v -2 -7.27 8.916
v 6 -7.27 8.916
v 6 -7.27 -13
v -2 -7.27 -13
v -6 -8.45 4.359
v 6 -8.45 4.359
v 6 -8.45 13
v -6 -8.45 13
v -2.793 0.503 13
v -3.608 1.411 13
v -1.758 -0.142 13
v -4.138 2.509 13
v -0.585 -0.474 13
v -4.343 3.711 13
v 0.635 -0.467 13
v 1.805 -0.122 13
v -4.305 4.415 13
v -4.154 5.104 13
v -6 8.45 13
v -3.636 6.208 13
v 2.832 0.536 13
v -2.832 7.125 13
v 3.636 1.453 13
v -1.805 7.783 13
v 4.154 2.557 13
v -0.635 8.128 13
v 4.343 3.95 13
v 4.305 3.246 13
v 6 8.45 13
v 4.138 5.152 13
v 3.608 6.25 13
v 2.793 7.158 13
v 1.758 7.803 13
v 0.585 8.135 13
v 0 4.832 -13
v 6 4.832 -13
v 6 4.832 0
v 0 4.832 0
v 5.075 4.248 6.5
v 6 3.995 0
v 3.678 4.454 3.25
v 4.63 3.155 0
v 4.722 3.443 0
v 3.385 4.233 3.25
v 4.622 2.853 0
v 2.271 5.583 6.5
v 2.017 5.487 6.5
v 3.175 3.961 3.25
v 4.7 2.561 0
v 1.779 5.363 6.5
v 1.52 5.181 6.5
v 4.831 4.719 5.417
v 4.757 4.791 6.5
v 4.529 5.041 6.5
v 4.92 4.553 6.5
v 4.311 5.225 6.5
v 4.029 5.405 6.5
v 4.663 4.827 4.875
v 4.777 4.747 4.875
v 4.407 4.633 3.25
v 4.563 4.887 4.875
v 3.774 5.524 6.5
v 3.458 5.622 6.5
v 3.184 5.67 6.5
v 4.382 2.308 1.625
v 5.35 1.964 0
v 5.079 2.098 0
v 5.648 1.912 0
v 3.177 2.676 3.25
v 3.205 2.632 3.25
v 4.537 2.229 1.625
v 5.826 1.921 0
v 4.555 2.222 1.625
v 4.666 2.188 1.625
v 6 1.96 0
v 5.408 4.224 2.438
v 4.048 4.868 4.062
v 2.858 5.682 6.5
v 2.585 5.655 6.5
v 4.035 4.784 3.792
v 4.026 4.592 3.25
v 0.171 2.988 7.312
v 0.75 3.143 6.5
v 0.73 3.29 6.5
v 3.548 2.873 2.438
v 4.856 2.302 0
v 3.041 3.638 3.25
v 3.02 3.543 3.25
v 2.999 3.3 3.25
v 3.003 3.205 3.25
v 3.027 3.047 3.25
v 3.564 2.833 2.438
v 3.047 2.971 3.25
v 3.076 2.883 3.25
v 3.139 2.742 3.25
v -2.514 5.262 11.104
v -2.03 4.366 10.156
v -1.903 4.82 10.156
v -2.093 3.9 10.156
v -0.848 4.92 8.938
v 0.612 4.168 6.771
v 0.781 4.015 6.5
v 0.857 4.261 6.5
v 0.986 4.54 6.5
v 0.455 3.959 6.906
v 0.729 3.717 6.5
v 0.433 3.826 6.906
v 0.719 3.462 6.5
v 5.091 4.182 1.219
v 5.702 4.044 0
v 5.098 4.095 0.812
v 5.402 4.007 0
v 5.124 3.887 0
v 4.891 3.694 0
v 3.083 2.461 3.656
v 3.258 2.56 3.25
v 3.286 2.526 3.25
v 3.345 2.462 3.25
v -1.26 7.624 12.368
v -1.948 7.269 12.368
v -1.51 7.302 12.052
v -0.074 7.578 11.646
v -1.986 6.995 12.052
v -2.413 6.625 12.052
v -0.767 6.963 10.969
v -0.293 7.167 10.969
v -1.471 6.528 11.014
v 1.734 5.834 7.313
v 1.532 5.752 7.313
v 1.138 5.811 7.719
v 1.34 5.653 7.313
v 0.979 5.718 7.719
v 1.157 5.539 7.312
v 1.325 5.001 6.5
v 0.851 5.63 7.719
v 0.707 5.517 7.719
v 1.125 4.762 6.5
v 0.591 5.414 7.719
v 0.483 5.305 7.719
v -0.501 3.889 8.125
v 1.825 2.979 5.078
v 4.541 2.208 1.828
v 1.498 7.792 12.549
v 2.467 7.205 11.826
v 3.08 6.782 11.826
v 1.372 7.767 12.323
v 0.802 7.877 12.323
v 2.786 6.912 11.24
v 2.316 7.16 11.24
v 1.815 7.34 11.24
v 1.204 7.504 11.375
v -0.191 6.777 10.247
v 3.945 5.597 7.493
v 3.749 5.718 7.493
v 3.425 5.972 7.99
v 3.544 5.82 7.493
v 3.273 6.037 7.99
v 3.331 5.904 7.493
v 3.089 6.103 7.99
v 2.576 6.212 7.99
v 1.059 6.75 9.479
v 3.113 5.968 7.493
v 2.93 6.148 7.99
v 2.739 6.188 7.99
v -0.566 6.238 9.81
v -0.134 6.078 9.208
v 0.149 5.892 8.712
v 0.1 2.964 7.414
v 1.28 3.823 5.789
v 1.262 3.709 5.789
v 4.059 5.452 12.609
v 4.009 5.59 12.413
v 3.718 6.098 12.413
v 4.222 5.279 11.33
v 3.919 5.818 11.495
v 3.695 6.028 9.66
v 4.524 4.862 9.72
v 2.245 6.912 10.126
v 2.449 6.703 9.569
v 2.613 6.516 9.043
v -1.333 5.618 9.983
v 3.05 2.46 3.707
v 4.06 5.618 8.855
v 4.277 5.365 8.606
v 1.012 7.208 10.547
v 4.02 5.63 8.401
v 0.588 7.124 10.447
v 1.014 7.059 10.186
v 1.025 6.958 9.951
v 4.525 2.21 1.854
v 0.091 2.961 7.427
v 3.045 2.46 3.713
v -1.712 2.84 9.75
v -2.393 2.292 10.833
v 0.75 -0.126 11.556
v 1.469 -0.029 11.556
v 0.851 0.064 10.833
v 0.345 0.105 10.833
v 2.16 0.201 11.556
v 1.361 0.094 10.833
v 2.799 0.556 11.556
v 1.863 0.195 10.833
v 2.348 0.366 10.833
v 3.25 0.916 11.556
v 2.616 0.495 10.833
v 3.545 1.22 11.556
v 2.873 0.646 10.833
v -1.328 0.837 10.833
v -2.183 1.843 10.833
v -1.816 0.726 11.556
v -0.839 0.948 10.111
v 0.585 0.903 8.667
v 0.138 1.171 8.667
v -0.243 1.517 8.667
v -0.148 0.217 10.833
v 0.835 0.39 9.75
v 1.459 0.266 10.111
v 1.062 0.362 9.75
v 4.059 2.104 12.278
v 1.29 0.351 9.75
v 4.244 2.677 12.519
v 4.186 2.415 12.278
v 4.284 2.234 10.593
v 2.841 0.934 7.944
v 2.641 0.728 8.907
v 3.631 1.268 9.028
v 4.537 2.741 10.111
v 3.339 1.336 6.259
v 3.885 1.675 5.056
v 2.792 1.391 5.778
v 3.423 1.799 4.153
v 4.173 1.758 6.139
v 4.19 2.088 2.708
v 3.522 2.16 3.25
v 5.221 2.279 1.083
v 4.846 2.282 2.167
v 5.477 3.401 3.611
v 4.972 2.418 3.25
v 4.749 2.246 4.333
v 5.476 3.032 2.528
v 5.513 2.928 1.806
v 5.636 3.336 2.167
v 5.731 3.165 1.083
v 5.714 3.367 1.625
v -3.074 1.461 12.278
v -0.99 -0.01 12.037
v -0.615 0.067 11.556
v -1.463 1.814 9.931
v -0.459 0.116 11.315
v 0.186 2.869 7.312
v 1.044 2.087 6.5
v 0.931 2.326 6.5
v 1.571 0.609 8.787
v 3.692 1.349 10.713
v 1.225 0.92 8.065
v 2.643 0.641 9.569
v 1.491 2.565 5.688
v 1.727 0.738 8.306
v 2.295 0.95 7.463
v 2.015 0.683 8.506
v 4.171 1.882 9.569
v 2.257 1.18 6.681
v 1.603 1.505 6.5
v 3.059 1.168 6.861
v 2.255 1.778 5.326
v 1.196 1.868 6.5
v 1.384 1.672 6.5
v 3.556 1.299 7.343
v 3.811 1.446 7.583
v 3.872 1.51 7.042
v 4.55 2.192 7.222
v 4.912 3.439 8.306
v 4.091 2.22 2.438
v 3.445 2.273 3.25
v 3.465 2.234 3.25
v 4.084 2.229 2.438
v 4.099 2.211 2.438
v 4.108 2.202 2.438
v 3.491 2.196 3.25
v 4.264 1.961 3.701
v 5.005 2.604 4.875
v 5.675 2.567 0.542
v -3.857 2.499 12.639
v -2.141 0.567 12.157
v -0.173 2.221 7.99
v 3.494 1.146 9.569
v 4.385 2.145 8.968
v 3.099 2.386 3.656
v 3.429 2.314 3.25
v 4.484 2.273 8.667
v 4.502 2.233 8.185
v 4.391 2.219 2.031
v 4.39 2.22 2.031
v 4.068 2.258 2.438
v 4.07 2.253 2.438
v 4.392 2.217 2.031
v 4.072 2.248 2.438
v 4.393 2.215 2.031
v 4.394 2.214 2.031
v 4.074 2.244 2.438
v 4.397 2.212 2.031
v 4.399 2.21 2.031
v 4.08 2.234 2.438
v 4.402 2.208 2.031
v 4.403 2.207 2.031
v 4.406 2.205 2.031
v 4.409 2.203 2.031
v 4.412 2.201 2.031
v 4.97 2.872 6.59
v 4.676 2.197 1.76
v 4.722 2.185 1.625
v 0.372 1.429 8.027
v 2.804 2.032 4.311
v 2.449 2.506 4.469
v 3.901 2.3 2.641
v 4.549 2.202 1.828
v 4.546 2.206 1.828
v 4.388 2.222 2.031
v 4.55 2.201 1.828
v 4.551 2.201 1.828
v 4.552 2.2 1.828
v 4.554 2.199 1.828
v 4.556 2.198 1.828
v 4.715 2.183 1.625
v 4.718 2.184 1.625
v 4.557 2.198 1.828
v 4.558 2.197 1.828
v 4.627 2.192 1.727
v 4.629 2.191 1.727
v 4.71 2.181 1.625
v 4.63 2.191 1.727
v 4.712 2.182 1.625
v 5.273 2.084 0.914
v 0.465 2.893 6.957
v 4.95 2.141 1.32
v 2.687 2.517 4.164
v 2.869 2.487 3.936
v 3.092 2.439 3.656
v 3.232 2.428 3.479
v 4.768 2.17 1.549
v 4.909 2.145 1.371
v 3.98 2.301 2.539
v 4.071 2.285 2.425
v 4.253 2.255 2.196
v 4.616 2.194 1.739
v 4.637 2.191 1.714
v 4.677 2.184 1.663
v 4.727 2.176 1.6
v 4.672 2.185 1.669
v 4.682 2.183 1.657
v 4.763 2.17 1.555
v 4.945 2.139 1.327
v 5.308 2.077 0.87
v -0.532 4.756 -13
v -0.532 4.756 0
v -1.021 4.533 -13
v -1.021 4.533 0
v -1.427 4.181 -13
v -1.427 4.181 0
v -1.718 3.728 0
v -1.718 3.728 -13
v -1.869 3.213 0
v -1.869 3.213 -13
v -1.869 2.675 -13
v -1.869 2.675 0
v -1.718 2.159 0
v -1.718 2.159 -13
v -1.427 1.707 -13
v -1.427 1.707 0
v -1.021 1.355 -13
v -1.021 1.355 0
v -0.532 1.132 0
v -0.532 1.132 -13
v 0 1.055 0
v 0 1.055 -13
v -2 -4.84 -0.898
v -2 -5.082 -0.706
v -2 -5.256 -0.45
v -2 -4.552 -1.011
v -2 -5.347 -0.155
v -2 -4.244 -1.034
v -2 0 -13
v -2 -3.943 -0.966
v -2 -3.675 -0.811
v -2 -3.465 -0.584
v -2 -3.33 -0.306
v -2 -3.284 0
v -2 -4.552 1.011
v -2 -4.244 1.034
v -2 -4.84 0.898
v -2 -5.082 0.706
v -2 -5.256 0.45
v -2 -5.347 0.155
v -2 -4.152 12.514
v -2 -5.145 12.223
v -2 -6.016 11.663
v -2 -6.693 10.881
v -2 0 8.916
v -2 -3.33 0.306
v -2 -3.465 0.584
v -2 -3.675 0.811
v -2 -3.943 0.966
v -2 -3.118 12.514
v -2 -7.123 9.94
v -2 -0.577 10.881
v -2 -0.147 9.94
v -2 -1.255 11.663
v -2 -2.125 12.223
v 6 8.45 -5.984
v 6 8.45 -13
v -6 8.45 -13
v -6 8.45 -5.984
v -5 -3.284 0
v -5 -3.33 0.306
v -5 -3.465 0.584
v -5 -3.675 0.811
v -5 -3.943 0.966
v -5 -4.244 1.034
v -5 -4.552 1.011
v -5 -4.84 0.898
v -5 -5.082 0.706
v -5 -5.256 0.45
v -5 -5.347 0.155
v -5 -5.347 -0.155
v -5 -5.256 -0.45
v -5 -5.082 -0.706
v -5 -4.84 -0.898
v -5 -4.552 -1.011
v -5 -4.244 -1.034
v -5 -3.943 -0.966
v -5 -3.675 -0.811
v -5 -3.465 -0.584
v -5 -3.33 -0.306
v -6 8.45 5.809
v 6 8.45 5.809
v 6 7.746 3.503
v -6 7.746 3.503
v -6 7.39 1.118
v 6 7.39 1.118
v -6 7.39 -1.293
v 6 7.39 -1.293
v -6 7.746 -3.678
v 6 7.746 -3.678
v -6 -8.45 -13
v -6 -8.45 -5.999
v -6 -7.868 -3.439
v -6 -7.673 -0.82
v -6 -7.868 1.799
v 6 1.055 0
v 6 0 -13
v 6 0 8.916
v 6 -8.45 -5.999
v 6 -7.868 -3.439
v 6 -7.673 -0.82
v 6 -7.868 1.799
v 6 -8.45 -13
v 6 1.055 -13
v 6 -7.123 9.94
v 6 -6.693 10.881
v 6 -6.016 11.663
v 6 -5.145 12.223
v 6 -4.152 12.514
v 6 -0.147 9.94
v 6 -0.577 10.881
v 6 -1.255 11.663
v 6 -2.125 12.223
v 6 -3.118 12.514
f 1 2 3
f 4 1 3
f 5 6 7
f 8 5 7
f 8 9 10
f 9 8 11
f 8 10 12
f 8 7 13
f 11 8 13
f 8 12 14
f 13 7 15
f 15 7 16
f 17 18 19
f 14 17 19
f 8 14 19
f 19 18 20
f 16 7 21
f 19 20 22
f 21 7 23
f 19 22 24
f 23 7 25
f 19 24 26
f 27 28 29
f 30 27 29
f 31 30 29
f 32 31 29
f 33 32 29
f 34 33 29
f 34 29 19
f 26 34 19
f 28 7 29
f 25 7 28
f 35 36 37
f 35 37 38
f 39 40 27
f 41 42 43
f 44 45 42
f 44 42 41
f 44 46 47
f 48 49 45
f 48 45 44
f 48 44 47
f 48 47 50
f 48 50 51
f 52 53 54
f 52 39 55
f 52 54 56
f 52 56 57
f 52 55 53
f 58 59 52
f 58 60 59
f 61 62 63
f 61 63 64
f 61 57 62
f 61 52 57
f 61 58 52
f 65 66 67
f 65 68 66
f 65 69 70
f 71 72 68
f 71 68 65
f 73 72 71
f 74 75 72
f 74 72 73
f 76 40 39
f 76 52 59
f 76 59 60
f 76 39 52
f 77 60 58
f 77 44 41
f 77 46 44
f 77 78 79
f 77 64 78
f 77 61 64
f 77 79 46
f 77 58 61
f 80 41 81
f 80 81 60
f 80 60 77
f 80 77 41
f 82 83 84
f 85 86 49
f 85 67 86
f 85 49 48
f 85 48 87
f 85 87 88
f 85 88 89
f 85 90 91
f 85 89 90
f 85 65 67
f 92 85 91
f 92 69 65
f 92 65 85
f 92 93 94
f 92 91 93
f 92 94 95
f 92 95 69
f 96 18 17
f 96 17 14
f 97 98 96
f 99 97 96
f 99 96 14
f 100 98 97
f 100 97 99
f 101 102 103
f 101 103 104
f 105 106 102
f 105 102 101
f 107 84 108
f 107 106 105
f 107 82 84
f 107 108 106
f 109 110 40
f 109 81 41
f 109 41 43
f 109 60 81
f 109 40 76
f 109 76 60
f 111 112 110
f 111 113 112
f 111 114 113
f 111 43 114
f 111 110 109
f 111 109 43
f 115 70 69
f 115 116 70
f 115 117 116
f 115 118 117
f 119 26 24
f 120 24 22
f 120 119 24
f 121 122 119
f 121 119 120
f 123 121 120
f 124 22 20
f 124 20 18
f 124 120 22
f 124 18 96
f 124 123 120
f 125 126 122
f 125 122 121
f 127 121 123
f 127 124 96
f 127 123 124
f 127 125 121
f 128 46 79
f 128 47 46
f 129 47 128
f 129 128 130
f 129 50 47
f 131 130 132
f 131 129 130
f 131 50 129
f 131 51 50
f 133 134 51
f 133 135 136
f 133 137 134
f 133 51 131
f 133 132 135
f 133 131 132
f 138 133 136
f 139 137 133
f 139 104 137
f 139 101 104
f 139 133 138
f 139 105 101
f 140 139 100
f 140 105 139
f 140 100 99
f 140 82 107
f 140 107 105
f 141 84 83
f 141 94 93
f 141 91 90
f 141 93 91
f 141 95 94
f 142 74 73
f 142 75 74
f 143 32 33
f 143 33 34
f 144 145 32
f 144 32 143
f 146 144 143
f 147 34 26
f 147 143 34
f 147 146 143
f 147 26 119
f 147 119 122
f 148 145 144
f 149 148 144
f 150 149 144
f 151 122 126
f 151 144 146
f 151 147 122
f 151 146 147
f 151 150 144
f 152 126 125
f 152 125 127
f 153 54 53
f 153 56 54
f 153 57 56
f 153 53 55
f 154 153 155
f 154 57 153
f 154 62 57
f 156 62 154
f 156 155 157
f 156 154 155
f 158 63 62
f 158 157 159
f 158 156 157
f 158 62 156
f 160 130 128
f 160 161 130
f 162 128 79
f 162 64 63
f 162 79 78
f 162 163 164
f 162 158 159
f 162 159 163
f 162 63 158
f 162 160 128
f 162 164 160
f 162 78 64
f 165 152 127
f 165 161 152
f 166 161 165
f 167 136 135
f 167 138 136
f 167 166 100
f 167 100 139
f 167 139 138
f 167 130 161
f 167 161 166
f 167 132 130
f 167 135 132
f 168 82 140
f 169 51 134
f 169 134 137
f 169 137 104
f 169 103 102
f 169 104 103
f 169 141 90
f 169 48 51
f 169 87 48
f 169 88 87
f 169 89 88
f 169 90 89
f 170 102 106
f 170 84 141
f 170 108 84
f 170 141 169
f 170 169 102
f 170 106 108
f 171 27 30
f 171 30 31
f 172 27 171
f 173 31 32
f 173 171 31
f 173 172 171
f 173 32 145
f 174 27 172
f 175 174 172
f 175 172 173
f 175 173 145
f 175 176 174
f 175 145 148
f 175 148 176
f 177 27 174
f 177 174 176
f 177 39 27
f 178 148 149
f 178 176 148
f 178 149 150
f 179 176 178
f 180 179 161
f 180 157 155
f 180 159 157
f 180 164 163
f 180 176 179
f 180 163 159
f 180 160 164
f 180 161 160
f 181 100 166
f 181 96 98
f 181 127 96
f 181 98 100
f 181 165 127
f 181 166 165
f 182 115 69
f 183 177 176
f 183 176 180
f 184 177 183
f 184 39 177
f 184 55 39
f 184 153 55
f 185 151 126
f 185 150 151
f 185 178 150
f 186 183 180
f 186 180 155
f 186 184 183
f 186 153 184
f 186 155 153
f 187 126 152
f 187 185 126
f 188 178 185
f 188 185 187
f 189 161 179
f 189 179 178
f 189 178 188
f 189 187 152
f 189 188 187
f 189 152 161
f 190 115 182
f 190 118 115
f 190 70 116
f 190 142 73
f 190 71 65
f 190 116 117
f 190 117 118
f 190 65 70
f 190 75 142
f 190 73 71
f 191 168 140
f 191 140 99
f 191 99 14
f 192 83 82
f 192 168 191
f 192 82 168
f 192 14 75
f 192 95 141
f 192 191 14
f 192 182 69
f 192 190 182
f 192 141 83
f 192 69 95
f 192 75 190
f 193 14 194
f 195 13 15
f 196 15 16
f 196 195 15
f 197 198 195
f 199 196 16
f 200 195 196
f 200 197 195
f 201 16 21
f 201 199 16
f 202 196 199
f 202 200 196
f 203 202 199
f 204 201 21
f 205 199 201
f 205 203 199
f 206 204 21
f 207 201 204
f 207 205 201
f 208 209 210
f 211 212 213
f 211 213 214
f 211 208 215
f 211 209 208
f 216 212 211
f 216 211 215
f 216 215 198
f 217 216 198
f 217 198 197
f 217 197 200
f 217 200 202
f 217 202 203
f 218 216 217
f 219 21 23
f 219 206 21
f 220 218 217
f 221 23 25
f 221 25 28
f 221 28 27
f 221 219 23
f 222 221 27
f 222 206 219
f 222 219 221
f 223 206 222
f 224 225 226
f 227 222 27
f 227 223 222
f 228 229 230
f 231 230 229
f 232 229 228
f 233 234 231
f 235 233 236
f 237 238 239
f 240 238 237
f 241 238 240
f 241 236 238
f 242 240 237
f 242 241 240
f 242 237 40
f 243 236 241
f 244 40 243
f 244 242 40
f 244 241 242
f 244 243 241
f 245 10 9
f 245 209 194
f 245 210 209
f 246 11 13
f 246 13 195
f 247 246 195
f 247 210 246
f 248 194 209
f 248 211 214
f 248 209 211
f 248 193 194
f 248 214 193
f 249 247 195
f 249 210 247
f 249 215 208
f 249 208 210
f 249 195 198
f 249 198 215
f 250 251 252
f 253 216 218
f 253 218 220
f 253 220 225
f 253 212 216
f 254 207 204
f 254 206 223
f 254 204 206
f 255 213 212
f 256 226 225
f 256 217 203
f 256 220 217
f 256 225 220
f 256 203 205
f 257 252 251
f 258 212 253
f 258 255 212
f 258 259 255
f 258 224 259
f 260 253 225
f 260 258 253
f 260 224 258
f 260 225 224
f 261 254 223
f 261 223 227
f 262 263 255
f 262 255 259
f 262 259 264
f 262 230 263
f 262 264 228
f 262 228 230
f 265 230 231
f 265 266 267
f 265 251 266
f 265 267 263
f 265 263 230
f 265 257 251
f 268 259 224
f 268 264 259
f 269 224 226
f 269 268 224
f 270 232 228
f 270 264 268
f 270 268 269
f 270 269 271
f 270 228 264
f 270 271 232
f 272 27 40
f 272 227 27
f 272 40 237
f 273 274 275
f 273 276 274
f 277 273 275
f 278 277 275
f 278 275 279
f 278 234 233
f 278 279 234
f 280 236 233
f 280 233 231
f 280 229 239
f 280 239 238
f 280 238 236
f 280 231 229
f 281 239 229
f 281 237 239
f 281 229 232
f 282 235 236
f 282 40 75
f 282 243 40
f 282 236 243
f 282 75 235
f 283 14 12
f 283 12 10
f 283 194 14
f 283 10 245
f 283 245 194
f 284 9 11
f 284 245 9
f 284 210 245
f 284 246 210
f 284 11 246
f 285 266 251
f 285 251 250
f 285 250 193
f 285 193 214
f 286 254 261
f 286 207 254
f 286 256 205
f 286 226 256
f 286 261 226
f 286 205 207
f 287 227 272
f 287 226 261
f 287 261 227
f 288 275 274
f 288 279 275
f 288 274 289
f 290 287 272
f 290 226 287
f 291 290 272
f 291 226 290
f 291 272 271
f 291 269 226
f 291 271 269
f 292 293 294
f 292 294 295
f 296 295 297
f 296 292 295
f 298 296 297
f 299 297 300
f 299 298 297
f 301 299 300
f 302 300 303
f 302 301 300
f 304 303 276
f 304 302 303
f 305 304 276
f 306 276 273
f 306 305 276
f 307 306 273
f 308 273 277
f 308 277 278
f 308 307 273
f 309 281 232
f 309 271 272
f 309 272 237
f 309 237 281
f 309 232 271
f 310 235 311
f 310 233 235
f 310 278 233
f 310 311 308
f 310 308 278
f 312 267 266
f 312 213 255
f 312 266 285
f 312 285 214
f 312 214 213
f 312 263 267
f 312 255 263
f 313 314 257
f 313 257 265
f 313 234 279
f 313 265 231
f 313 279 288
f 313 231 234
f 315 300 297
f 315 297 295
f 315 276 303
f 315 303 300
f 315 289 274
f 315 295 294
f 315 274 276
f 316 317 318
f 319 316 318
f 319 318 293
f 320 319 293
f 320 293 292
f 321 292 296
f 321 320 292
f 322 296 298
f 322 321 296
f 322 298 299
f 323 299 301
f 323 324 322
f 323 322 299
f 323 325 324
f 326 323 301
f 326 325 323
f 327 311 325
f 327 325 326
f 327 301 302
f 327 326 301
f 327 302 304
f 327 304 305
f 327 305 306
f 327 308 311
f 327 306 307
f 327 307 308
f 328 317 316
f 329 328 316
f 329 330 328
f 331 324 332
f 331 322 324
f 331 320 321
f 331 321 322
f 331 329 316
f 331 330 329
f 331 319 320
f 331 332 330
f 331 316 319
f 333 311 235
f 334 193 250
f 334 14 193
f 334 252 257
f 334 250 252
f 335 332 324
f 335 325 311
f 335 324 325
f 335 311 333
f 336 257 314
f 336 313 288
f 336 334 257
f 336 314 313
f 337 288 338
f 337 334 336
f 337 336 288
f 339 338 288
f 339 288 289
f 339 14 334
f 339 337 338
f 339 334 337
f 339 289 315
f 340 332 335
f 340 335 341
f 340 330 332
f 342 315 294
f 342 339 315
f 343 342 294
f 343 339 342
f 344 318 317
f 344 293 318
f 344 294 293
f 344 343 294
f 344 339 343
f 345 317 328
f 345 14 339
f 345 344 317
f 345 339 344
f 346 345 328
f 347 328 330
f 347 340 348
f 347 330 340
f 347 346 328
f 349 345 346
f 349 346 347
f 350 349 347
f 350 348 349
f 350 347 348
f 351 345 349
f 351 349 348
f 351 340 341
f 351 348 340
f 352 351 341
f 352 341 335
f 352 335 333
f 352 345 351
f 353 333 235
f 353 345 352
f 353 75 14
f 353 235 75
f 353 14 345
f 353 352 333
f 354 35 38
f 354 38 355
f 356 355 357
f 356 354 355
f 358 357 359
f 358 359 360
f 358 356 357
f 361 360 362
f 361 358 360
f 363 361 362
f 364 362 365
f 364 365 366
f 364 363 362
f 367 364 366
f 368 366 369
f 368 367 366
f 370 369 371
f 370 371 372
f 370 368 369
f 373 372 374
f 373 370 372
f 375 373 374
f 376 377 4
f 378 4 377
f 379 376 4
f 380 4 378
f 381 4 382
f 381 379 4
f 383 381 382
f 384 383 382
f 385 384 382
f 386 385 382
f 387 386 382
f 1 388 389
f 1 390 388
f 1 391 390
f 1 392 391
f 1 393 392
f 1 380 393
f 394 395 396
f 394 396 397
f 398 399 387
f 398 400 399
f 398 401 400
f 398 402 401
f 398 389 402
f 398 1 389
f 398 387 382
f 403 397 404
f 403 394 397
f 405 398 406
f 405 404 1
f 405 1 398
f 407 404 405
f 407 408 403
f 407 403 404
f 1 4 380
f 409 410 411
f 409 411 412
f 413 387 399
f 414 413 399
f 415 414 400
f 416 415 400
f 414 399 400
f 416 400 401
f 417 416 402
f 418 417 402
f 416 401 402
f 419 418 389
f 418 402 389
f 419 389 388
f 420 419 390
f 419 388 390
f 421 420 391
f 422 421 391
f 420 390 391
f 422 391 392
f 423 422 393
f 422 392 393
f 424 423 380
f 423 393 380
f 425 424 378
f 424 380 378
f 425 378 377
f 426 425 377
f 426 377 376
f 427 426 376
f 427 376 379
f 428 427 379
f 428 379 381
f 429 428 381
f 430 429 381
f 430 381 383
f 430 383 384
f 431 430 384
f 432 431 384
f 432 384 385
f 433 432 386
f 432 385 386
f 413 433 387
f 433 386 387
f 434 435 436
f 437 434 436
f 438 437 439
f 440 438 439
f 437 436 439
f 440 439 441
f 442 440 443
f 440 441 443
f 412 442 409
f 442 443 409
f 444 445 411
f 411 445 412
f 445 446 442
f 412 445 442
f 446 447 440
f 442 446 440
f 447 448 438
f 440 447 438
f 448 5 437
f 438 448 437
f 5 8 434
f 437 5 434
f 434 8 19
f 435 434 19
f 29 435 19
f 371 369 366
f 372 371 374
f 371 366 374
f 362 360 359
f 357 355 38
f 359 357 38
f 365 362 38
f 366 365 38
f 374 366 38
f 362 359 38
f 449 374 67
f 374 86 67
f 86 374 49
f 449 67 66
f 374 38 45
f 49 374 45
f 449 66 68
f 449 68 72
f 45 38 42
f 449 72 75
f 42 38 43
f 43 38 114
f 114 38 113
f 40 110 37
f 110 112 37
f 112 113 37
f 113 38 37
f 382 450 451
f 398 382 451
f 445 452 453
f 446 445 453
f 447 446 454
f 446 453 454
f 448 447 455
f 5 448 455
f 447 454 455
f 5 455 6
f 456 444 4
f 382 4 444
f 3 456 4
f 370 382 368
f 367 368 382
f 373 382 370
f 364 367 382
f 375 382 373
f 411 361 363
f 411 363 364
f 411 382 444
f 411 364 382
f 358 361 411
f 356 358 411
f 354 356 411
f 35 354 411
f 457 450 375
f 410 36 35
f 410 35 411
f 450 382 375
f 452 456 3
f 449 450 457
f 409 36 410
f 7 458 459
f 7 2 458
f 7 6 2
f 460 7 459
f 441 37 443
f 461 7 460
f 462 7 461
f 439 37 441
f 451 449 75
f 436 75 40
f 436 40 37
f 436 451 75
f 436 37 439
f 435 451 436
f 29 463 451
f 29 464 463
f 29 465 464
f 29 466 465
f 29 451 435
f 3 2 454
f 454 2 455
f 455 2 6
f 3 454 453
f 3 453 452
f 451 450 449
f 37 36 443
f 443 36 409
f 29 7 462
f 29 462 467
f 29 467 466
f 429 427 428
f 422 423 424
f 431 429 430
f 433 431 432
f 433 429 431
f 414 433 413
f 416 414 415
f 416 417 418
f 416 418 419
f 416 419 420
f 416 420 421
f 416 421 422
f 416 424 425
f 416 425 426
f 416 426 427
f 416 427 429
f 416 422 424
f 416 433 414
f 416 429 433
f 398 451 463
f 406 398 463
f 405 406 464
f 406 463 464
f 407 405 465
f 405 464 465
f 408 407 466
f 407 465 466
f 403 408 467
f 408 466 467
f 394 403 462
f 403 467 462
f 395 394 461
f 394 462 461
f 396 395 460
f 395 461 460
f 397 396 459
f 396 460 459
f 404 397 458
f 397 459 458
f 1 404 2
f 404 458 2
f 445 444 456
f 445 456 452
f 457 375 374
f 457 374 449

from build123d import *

# Parameters (mm, degrees)
F0_W      = 16.9
F0_H      = 26
F1_DEPTH  = 6
F4_DEPTH  = 8
F7_DEPTH  = 13
F13_R     = 1.0372867361
F14_DEPTH = 3
F16_DEPTH = 12


# Not quite as in the source:
# - the arcs of a loft's sections are written as splines that run evenly, so that the points pair up as in the source's solid


with BuildPart() as f1:
    # F0 (on Right) → F1 (new body, symmetric)
    with BuildSketch(Plane.YZ):
        Rectangle(F0_W, F0_H)
    extrude(amount=F1_DEPTH, both=True)

    # F3 (on offset) → F4 (cut)
    with BuildSketch(Plane.YZ.offset(6)):
        with BuildLine():
            Line((0, -13.1401689723), (0, 0))
            Line((0, 0), (0, 8.9160166681))
            ThreePointArc((0, 8.9160166681), (-3.6351196468, 12.5511363149), (-7.2702392936, 8.9160166681))
            Line((-7.2702392936, 8.9160166681), (-7.2702392936, 0))
            Line((-7.2702392936, 0), (-7.2702392936, -13.1401689723))
            Line((-7.2702392936, -13.1401689723), (0, -13.1401689723))
        make_face()
    extrude(amount=-F4_DEPTH, mode=Mode.SUBTRACT)

    # F6 (on offset) → F7 (cut)
    with BuildSketch(Plane.XY.offset(-13)):
        with BuildLine():
            Line((0, 1.0551682208), (6, 1.0551682208))
            Line((6, 1.0551682208), (6, 4.8324568197))
            Line((6, 4.8324568197), (0, 4.8324568197))
            ThreePointArc((0, 4.8324568197), (-1.8886442995, 2.9438125202), (0, 1.0551682208))
        make_face()
    extrude(amount=F7_DEPTH, mode=Mode.SUBTRACT)

    # F10 (on offset) → F11 section 0
    with BuildSketch(Plane.XY.offset(13)):
        with BuildLine():
            add(Edge.make_bspline(
                [(4.3429478235, 3.9498277403), (4.3273258404, 4.518318281), (4.1986746967, 5.0834789619), (3.734705213, 6.1219559637), (3.3995694252, 6.5948636881), (2.5735095721, 7.3767379005), (2.0829105259, 7.6853967543), (1.0205204277, 8.0916349162), (0.4491473807, 8.1890543869), (-0.6878337007, 8.1578104207), (-1.2529943817, 8.0291592769), (-2.2914713834, 7.5651897932), (-2.7643791079, 7.2300540055), (-3.5462533203, 6.4039941523), (-3.8549121741, 5.9133951062), (-4.261150336, 4.8510050079), (-4.3585698066, 4.279631961), (-4.3429478235, 3.7111414202)],
                knots=[0, 0, 0, 0, 0.125, 0.125, 0.25, 0.25, 0.375, 0.375, 0.5, 0.5, 0.625, 0.625, 0.75, 0.75, 0.875, 0.875, 1, 1, 1, 1], degree=3))
            add(Edge.make_bspline(
                [(-4.3429478235, 3.7111414202), (-4.3273258404, 3.1426508795), (-4.1986746967, 2.5774901986), (-3.734705213, 1.5390131968), (-3.3995694252, 1.0661054724), (-2.5735095721, 0.28423126), (-2.0829105259, -0.0244275938), (-1.0205204277, -0.4306657557), (-0.4491473807, -0.5280852264), (0.6878337007, -0.4968412602), (1.2529943817, -0.3681901164), (2.2914713834, 0.0957793673), (2.7643791079, 0.430915155), (3.5462533203, 1.2569750082), (3.8549121741, 1.7475740543), (4.261150336, 2.8099641525), (4.3585698066, 3.3813371995), (4.3429478235, 3.9498277403)],
                knots=[0, 0, 0, 0, 0.125, 0.125, 0.25, 0.25, 0.375, 0.375, 0.5, 0.5, 0.625, 0.625, 0.75, 0.75, 0.875, 0.875, 1, 1, 1, 1], degree=3))
        make_face()
    # F8 (on Top) → F11 section 1
    with BuildSketch(Plane.XY):
        with BuildLine():
            Line((6, 1.9599355292), (6, 3.9953631349))
            add(Edge.make_bspline(
                [(6, 3.9953631349), (5.8728482854, 4.0351535262), (5.7381950052, 4.0508266131), (5.4724119576, 4.0317817528), (5.3413690344, 3.9970700285), (5.1010102922, 3.8820439003), (4.9917730101, 3.8017670809), (4.8102123375, 3.6067310401), (4.7379482715, 3.4920355462), (4.640395332, 3.2440703086), (4.6151383336, 3.110881587), (4.6151383336, 2.844417077), (4.640395332, 2.7112283554), (4.7379482715, 2.4632631178), (4.8102123375, 2.348567624), (4.9917730101, 2.1535315831), (5.1010102922, 2.0732547638), (5.3413690344, 1.9582286356), (5.4724119576, 1.9235169113), (5.7381950052, 1.904472051), (5.8728482854, 1.9201451378), (6, 1.9599355292)],
                knots=[0, 0, 0, 0, 0.1, 0.1, 0.2, 0.2, 0.3, 0.3, 0.4, 0.4, 0.5, 0.5, 0.6, 0.6, 0.7, 0.7, 0.8, 0.8, 0.9, 0.9, 1, 1, 1, 1], degree=3))
        make_face()
    loft(ruled=True, mode=Mode.SUBTRACT)

    # F13 (on offset) → F14 (cut)
    with BuildSketch(Plane.YZ.offset(-2)):
        with Locations((-4.3216282502, 0)):
            Circle(F13_R)
    extrude(amount=-F14_DEPTH, mode=Mode.SUBTRACT)

    # F15 (on offset) → F16 (cut)
    with BuildSketch(Plane.YZ.offset(6)):
        with BuildLine():
            Line((8.45, -5.9837657027), (8.45, 5.8088130318))
            ThreePointArc((8.45, 5.8088130318), (7.3449803731, -0.0874763355), (8.45, -5.9837657027))
        make_face()
        with BuildLine():
            Line((-8.45, 4.3591358699), (-8.45, -5.9991455637))
            ThreePointArc((-8.45, -5.9991455637), (-7.6726197795, -0.8200048469), (-8.45, 4.3591358699))
        make_face()
    extrude(amount=-F16_DEPTH, mode=Mode.SUBTRACT)


solid = f1.part
